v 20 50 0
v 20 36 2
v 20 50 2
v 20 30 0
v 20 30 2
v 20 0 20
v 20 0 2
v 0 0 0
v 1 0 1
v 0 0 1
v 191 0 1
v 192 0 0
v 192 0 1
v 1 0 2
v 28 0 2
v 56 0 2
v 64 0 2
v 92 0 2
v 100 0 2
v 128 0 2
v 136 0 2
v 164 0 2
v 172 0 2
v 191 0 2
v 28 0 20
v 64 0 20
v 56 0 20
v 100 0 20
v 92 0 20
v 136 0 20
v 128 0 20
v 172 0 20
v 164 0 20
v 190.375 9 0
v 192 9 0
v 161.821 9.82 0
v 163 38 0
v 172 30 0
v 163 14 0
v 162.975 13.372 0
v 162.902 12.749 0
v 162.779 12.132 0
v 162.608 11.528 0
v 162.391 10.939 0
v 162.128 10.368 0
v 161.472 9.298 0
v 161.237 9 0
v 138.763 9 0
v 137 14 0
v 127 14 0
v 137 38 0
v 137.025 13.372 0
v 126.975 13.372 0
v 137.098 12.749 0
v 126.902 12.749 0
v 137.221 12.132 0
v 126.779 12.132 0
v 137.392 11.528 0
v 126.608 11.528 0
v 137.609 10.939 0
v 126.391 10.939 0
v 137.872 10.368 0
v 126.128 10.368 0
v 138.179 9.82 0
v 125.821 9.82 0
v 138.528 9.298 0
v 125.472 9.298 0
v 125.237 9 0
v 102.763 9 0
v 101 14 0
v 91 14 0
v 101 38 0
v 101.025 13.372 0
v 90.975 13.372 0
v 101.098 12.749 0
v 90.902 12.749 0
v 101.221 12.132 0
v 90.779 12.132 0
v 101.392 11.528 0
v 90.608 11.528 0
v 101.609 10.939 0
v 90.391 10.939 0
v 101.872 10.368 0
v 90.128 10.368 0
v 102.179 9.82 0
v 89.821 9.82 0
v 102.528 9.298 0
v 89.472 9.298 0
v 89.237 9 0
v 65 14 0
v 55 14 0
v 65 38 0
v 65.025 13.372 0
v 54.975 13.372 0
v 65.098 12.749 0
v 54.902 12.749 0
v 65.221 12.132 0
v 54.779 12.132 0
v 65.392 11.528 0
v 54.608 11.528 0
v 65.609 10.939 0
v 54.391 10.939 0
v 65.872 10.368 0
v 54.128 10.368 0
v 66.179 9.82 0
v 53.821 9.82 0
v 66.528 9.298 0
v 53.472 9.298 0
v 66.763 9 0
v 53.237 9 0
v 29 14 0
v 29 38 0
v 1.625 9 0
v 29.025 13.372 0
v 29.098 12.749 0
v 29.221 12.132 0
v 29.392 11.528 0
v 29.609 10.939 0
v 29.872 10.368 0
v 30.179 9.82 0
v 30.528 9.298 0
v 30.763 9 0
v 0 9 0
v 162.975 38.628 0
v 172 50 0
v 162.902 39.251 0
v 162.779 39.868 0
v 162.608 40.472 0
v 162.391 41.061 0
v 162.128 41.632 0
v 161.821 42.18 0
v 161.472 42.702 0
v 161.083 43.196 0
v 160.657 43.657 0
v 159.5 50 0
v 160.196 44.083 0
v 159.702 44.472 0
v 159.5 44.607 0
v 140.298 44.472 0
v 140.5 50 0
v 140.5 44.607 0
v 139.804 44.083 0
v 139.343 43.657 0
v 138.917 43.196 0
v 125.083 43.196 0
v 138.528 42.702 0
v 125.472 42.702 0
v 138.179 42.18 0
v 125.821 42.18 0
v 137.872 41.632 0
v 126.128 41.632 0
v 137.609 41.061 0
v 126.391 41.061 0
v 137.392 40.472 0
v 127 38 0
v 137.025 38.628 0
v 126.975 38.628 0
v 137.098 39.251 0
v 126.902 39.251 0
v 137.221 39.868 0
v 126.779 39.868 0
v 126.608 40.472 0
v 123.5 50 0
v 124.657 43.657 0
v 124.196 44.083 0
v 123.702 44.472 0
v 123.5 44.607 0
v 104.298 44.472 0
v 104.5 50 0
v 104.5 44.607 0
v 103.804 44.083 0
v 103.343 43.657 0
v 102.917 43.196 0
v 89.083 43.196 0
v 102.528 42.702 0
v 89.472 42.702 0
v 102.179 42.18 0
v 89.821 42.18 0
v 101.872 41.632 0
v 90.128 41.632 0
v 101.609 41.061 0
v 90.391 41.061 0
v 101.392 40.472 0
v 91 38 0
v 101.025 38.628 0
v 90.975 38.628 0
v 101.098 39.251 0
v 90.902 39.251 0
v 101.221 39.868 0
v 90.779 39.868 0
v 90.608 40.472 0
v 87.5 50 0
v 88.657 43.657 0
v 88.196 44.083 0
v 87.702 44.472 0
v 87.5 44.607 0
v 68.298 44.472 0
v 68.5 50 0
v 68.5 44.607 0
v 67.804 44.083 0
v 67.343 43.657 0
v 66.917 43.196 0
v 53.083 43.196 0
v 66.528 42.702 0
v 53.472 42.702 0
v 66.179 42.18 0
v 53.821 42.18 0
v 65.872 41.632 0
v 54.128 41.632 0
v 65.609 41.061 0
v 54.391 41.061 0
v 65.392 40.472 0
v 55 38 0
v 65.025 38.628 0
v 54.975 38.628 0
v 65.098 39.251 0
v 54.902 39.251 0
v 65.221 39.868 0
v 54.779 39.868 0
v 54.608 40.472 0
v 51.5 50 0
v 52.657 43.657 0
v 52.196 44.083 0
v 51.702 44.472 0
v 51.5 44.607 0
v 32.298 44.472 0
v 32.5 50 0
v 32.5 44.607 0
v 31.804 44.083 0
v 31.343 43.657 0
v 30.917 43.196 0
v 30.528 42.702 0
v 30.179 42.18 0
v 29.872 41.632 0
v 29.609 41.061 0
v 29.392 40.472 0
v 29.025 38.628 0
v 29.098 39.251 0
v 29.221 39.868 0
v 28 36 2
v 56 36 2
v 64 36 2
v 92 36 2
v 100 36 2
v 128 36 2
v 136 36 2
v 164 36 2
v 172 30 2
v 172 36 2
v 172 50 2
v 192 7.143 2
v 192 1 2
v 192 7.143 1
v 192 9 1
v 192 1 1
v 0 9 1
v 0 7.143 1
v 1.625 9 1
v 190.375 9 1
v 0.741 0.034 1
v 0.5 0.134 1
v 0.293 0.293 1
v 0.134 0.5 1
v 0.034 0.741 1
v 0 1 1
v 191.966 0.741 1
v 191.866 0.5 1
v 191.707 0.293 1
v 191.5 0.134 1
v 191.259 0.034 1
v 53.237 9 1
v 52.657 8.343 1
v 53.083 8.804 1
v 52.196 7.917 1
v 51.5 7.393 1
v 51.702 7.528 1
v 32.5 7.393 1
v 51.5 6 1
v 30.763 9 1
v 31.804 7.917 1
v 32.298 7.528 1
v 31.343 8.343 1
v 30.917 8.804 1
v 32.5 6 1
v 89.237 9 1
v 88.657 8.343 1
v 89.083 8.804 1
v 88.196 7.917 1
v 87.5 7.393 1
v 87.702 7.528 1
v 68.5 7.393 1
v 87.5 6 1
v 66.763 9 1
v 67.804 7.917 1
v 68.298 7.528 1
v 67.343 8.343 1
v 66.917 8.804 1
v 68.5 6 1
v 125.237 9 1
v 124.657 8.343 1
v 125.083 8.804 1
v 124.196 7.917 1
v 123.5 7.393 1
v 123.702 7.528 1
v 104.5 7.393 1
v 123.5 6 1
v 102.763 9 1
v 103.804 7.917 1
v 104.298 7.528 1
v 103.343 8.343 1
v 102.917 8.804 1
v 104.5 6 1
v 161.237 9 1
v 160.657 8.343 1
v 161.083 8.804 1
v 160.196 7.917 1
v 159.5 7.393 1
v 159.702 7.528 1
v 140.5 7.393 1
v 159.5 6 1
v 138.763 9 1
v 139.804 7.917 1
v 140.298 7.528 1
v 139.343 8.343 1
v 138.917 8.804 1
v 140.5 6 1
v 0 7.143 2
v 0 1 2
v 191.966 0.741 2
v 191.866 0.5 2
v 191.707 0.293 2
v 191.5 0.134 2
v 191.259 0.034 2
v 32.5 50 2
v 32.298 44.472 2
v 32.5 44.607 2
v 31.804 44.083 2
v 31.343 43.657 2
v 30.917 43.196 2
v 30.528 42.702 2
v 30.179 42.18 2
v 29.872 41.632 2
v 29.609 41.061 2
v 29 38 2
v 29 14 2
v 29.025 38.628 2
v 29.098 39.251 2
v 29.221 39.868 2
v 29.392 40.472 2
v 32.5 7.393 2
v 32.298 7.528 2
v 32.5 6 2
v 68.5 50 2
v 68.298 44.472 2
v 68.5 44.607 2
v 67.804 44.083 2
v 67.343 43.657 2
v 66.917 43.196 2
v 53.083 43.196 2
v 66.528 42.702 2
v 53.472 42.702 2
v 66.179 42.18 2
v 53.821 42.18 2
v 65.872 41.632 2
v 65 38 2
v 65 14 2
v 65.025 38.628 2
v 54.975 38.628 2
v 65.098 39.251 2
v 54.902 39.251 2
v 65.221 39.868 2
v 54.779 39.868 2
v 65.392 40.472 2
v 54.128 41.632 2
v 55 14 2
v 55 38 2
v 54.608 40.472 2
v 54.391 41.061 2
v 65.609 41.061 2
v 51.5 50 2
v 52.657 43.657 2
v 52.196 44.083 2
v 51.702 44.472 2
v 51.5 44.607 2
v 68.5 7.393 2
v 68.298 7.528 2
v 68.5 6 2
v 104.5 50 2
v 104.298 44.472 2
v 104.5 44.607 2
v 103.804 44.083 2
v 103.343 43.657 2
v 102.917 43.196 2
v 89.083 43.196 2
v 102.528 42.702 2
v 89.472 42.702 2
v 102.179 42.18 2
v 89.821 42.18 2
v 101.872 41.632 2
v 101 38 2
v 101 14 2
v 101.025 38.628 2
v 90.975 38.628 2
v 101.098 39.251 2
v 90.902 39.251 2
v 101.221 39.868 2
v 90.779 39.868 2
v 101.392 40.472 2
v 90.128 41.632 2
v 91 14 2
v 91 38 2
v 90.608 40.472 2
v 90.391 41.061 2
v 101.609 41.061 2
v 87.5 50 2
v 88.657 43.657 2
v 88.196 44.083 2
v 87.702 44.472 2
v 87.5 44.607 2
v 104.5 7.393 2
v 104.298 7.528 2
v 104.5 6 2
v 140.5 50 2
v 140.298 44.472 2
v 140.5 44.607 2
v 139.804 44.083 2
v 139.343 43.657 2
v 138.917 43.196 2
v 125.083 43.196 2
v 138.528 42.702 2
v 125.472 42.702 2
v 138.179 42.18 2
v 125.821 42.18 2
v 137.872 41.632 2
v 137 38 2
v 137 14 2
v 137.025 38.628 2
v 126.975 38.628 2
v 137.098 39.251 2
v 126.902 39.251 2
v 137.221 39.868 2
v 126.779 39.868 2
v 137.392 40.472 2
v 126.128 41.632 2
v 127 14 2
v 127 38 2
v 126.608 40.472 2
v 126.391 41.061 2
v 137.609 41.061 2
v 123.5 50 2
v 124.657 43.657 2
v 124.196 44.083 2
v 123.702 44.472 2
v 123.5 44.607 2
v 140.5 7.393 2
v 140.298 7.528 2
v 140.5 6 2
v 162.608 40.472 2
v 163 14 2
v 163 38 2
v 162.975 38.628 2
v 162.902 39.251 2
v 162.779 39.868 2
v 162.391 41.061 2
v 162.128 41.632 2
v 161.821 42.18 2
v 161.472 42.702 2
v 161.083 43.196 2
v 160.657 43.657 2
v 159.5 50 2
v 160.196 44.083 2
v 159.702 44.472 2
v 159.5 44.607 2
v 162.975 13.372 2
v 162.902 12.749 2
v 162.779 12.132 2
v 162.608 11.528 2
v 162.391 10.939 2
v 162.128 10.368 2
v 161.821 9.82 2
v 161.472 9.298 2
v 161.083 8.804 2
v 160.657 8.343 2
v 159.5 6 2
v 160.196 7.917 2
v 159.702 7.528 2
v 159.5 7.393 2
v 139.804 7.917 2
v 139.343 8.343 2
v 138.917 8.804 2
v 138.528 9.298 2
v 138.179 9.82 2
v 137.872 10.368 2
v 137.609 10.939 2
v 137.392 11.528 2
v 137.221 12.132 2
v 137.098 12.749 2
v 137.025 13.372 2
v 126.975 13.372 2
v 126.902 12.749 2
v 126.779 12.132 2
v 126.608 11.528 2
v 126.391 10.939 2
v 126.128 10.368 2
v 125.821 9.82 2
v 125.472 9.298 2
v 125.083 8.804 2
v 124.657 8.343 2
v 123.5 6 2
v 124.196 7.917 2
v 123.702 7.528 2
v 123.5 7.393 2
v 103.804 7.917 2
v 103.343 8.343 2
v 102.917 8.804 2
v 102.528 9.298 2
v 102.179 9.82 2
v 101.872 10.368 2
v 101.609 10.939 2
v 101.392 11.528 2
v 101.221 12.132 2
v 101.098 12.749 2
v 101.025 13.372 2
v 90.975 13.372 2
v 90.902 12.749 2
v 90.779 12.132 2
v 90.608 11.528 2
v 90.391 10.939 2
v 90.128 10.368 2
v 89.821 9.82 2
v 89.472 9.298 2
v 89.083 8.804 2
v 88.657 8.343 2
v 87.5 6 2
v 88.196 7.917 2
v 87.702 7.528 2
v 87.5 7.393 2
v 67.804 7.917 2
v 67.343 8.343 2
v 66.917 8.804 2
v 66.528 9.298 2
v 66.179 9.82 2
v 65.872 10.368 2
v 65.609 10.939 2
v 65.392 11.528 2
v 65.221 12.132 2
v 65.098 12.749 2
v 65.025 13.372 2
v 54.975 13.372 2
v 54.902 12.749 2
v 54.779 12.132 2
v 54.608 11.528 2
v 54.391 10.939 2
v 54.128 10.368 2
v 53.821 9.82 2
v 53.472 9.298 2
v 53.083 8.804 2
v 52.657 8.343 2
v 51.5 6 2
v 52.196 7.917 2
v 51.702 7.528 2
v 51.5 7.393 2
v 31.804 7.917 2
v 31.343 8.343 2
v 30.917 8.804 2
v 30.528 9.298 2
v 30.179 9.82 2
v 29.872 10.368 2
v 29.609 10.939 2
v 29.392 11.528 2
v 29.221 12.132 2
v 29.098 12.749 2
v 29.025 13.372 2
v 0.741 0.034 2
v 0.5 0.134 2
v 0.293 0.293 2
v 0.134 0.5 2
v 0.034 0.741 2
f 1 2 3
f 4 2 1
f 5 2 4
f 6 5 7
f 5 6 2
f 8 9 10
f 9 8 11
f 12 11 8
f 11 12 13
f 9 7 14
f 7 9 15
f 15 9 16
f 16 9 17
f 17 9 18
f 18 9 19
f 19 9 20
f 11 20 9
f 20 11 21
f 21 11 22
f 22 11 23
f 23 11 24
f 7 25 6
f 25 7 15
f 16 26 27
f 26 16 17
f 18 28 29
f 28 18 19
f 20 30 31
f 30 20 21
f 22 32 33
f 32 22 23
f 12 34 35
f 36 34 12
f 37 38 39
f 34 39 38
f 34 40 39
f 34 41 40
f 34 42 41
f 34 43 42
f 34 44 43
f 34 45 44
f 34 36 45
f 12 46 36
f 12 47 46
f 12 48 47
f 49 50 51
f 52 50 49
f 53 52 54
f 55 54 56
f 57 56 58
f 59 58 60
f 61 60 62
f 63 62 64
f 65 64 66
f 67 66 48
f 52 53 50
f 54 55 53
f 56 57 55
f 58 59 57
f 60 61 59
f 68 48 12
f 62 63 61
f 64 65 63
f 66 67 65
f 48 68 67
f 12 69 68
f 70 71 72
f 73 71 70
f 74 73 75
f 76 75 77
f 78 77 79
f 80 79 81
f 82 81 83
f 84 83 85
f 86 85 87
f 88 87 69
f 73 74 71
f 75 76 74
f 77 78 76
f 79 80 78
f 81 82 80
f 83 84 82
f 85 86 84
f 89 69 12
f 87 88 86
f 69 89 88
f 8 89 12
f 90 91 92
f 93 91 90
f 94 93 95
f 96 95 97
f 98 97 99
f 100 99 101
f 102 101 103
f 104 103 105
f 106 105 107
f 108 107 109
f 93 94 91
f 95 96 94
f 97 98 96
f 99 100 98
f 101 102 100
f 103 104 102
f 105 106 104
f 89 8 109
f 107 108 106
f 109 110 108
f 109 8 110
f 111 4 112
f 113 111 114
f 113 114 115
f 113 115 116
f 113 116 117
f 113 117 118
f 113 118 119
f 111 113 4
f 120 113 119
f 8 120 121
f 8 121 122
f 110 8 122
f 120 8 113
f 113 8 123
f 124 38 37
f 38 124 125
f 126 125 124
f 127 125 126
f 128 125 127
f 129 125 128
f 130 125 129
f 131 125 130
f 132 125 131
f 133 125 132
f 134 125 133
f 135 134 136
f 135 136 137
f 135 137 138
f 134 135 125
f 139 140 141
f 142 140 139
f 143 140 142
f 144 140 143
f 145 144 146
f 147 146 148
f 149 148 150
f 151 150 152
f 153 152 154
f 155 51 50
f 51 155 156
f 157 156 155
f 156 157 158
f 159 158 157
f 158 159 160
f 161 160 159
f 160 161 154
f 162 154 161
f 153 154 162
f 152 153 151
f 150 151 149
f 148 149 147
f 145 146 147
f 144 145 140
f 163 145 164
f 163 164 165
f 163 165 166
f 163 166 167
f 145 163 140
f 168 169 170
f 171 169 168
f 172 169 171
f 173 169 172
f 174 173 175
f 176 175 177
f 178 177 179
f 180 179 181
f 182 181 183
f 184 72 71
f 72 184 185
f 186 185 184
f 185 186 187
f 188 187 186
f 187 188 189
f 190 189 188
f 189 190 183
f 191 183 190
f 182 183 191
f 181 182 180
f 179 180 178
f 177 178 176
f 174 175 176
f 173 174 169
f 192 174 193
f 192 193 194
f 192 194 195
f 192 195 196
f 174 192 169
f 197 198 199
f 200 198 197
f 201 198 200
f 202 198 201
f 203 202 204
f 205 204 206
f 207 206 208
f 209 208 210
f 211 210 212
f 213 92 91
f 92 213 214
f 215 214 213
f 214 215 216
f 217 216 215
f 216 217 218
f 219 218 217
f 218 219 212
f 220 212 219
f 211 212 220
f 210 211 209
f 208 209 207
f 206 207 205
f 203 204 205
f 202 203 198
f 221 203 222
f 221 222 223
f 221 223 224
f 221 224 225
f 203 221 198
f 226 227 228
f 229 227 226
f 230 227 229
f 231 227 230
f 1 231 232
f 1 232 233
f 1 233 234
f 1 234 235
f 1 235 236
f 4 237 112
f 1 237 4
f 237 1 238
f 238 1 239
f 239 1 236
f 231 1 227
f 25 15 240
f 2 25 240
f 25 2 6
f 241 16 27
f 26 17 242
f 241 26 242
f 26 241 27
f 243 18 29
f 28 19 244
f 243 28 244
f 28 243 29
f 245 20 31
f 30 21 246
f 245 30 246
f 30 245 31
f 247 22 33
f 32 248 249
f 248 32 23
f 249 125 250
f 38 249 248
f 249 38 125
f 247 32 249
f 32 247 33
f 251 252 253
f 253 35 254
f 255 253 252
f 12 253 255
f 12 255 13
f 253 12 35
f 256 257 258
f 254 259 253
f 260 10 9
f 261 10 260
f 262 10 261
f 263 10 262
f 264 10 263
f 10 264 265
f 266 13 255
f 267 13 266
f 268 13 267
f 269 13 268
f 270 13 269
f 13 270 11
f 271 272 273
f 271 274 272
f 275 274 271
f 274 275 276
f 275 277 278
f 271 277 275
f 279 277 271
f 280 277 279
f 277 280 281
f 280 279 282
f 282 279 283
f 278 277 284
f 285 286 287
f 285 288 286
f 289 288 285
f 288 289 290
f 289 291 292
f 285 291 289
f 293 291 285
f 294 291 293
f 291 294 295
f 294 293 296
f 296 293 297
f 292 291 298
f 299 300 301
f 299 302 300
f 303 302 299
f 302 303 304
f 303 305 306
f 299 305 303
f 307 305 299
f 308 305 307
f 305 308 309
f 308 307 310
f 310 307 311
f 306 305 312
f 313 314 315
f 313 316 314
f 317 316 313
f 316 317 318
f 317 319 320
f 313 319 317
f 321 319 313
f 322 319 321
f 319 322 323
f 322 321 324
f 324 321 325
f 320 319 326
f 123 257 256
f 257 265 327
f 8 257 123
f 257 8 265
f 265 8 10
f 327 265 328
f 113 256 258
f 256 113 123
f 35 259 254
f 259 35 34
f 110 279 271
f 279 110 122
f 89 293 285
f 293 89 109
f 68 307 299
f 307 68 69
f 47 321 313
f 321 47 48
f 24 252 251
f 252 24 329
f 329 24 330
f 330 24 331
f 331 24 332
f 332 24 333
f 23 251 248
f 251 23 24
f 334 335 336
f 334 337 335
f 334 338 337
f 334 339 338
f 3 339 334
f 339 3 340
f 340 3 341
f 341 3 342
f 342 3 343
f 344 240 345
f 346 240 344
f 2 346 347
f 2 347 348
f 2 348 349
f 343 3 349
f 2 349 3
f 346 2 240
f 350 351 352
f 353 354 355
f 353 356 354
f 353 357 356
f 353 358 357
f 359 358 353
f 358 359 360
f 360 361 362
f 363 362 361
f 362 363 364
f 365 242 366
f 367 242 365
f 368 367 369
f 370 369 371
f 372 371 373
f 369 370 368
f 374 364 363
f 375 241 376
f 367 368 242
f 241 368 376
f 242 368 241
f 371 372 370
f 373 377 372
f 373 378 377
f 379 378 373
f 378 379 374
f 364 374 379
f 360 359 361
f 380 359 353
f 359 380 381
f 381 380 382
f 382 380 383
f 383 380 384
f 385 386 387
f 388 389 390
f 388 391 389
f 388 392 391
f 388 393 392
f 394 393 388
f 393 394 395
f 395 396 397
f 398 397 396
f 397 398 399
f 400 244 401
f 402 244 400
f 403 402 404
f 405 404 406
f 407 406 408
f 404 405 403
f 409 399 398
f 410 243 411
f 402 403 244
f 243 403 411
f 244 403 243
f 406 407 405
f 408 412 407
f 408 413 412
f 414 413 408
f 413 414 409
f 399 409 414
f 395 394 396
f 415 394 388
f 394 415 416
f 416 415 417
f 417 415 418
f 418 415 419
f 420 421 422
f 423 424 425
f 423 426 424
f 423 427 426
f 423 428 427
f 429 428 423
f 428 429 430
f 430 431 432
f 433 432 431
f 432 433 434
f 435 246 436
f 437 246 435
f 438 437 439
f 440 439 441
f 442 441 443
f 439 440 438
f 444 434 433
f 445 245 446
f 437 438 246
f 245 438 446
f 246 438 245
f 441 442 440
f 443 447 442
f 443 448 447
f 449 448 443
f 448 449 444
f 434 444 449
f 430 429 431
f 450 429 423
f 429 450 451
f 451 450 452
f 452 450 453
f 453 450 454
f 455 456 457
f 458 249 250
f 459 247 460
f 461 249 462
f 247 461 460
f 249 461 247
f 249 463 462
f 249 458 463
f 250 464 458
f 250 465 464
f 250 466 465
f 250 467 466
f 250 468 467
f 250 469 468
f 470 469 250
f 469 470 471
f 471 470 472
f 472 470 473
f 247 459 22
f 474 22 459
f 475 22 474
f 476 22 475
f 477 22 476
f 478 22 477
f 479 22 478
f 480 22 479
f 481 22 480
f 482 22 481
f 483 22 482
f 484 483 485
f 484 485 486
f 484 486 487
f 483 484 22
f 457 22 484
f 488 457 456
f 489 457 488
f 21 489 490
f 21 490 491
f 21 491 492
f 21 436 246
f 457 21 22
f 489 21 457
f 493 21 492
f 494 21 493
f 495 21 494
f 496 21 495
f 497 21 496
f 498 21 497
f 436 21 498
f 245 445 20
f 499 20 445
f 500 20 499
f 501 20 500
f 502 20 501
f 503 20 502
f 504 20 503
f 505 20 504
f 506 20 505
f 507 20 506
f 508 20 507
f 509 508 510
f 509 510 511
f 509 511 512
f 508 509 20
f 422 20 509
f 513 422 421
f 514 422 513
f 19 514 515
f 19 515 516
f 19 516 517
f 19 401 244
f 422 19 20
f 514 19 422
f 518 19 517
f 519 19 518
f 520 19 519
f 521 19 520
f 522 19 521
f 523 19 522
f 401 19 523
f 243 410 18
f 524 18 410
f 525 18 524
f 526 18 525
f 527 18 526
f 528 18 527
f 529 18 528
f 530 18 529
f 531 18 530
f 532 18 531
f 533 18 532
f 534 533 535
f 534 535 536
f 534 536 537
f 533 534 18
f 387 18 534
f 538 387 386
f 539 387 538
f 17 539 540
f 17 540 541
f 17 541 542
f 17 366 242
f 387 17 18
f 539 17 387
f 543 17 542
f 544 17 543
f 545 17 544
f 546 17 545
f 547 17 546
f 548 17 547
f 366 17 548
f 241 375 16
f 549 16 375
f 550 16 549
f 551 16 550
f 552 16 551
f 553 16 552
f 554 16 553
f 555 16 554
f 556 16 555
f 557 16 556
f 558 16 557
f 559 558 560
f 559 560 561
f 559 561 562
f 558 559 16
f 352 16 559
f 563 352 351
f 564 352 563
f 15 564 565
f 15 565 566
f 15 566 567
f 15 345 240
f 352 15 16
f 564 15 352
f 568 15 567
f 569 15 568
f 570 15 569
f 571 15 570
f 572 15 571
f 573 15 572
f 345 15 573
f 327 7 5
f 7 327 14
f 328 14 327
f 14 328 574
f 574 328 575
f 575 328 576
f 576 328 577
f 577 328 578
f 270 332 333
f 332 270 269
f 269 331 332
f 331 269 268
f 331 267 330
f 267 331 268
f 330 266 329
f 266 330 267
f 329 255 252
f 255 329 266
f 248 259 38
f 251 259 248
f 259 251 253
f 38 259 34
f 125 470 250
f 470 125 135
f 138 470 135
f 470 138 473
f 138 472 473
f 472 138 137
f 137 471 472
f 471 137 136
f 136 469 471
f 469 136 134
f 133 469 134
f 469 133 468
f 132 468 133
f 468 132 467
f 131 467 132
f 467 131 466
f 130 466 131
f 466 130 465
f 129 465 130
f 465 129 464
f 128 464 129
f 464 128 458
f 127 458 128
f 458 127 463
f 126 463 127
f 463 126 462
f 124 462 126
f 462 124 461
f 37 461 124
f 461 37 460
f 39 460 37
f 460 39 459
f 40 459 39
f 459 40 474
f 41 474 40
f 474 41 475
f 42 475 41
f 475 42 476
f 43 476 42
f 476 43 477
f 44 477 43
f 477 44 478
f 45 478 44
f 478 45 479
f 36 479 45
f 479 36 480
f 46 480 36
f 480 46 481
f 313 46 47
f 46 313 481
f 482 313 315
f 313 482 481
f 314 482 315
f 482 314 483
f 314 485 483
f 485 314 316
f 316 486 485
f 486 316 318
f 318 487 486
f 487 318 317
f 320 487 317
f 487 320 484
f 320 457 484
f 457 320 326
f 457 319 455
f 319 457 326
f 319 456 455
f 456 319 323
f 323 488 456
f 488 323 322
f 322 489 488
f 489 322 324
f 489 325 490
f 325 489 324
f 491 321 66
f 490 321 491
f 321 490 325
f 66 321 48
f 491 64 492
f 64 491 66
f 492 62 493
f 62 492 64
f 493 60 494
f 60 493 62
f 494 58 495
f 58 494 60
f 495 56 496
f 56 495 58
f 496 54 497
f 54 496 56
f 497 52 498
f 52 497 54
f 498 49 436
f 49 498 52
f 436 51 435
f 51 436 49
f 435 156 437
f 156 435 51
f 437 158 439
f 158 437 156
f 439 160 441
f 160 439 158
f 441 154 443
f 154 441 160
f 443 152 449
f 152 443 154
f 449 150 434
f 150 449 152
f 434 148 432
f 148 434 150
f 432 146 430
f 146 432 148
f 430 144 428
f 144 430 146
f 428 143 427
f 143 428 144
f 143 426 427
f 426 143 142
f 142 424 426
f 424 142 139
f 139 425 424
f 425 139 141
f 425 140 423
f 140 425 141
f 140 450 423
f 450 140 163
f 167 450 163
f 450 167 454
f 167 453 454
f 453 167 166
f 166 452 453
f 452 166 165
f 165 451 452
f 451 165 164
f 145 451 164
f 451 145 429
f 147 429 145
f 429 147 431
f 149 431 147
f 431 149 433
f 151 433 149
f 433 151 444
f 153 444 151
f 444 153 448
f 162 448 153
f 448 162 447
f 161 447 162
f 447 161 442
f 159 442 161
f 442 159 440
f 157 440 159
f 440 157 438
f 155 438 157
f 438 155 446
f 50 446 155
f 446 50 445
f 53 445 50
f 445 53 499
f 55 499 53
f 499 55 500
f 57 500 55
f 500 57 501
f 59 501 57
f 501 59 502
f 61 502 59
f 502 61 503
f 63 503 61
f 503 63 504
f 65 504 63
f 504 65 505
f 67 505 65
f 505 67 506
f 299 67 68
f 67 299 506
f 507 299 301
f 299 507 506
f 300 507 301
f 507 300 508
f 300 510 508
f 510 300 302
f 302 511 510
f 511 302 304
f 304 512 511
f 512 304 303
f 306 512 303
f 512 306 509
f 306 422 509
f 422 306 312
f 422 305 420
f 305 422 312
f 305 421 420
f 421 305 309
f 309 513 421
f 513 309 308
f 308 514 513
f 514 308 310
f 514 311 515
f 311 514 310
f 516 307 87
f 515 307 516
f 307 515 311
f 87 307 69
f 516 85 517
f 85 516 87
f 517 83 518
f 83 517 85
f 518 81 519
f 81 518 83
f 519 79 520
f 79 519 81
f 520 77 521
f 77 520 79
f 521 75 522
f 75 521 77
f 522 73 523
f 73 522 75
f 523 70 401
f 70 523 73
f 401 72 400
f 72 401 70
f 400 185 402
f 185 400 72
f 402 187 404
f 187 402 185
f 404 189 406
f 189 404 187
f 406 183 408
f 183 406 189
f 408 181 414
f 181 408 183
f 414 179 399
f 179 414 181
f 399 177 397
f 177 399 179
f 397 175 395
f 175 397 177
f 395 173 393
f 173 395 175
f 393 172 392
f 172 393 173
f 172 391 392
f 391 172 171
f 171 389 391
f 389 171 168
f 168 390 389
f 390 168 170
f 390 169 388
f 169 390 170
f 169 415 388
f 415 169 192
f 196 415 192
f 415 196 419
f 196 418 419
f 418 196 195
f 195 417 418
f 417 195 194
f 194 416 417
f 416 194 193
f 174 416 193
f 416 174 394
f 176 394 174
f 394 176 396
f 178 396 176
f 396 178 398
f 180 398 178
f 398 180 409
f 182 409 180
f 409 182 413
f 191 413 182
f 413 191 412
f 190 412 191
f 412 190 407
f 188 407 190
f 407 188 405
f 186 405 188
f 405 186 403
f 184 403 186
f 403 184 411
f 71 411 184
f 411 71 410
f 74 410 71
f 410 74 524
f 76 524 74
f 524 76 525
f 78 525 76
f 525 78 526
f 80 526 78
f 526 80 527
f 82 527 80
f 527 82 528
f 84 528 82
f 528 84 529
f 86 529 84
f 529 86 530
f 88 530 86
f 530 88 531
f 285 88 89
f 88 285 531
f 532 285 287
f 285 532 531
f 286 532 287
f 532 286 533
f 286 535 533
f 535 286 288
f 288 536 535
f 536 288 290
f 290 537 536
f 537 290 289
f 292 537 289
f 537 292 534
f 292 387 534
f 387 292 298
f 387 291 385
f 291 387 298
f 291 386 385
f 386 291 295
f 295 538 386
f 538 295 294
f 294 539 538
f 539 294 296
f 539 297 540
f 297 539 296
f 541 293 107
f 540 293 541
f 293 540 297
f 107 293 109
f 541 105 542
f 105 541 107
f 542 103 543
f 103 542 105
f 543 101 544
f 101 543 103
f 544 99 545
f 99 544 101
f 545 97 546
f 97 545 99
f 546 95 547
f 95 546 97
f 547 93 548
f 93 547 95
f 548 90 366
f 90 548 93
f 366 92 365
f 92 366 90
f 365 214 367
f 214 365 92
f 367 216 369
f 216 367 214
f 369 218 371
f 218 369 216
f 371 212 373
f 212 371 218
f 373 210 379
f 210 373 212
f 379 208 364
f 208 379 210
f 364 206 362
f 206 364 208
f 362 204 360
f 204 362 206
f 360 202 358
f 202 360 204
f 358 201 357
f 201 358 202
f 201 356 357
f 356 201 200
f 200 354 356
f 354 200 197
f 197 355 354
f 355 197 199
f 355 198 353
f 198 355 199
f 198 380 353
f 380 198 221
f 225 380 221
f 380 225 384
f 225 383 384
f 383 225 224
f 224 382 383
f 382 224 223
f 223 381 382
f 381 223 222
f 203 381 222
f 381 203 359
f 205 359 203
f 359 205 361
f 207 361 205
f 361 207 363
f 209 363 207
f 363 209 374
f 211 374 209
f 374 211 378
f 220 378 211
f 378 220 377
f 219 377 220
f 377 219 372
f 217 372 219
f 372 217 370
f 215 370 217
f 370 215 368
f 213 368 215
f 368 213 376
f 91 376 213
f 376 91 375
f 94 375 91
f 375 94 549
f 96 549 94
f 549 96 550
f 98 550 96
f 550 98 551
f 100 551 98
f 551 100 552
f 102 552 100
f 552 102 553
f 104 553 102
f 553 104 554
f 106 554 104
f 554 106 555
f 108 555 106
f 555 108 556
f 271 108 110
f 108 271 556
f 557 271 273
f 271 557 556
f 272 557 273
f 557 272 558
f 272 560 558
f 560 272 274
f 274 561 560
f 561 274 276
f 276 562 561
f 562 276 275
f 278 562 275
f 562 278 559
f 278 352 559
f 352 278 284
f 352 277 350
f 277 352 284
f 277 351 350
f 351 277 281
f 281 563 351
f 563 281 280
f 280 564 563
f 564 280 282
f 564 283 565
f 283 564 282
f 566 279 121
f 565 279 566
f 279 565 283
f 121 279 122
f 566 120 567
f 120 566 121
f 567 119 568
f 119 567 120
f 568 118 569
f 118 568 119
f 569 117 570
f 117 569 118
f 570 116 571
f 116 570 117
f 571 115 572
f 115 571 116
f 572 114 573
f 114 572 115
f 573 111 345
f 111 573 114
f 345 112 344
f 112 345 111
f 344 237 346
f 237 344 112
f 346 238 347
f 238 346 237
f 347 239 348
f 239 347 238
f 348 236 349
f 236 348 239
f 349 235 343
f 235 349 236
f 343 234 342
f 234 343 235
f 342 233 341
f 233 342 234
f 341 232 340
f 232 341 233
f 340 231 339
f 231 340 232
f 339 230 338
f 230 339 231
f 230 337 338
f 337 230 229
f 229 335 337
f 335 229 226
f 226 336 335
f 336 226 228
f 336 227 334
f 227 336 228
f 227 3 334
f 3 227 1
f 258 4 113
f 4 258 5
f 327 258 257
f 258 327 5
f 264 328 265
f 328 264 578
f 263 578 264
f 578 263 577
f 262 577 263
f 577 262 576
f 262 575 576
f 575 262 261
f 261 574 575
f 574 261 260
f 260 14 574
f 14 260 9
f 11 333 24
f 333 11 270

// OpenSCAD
cube([192,9,1]);
for(x=[20:36:170]) translate([x,0,20]) rotate([0,90,0]) linear_extrude(8) polygon([[0,0],[20,40],[20,0]]);
linear_extrude(2)
difference() {
round_rect([192,50],1);
  mirrorx(96) polygon([[-1,6],[20,30],[20,51],[-1,51]]);
  
  translate([20,0]) {
    
for(x=[10:36:140])
{
  translate([x-1,6]) round_rect([26,40],r=8);
  translate([x+2.5,6]) square([19,50]);
}
}
}

module round_rect(dims,r=1)
{
  spots=[[r,r],[r,dims[1]-r],[dims[0]-r,dims[1]-r],[dims[0]-r,r]];
  for(i=[0:3])
    translate(spots[i]) rotate([0,0,270+i*90]) circle(r=r,$fn=16+(r*8));
  translate([r,0]) square([dims[0]-r*2,dims[1]]);
  translate([0,r]) square([dims[0],dims[1]-r*2]);
}

function arc(a1,a2,r,$fn) =
  (a1+((a2-a1)/$fn)>=a2?
    [arcpoint(a2,r)] :
    concat([arcpoint(a1,r)],arc(a1+$fn, a2, r, $fn)));
function arcpoint(angle,r) = [r*cos(angle),r*sin(angle)];

module mirrorz(offset=0)
{
  translate([0,0,offset]) for(m=[0,1]) mirror([0,0,m]) translate([0,0,offset*-1]) children();
}
module mirrory(offset=0)
{
  translate([0,offset,0]) for(m=[0,1]) mirror([0,m,0]) translate([0,offset*-1,0]) children();
}
module mirrorx(offset=0)
{
  translate([offset,0]) for(m=[0,1]) mirror([m,0]) translate([offset*-1,0]) children();
}
